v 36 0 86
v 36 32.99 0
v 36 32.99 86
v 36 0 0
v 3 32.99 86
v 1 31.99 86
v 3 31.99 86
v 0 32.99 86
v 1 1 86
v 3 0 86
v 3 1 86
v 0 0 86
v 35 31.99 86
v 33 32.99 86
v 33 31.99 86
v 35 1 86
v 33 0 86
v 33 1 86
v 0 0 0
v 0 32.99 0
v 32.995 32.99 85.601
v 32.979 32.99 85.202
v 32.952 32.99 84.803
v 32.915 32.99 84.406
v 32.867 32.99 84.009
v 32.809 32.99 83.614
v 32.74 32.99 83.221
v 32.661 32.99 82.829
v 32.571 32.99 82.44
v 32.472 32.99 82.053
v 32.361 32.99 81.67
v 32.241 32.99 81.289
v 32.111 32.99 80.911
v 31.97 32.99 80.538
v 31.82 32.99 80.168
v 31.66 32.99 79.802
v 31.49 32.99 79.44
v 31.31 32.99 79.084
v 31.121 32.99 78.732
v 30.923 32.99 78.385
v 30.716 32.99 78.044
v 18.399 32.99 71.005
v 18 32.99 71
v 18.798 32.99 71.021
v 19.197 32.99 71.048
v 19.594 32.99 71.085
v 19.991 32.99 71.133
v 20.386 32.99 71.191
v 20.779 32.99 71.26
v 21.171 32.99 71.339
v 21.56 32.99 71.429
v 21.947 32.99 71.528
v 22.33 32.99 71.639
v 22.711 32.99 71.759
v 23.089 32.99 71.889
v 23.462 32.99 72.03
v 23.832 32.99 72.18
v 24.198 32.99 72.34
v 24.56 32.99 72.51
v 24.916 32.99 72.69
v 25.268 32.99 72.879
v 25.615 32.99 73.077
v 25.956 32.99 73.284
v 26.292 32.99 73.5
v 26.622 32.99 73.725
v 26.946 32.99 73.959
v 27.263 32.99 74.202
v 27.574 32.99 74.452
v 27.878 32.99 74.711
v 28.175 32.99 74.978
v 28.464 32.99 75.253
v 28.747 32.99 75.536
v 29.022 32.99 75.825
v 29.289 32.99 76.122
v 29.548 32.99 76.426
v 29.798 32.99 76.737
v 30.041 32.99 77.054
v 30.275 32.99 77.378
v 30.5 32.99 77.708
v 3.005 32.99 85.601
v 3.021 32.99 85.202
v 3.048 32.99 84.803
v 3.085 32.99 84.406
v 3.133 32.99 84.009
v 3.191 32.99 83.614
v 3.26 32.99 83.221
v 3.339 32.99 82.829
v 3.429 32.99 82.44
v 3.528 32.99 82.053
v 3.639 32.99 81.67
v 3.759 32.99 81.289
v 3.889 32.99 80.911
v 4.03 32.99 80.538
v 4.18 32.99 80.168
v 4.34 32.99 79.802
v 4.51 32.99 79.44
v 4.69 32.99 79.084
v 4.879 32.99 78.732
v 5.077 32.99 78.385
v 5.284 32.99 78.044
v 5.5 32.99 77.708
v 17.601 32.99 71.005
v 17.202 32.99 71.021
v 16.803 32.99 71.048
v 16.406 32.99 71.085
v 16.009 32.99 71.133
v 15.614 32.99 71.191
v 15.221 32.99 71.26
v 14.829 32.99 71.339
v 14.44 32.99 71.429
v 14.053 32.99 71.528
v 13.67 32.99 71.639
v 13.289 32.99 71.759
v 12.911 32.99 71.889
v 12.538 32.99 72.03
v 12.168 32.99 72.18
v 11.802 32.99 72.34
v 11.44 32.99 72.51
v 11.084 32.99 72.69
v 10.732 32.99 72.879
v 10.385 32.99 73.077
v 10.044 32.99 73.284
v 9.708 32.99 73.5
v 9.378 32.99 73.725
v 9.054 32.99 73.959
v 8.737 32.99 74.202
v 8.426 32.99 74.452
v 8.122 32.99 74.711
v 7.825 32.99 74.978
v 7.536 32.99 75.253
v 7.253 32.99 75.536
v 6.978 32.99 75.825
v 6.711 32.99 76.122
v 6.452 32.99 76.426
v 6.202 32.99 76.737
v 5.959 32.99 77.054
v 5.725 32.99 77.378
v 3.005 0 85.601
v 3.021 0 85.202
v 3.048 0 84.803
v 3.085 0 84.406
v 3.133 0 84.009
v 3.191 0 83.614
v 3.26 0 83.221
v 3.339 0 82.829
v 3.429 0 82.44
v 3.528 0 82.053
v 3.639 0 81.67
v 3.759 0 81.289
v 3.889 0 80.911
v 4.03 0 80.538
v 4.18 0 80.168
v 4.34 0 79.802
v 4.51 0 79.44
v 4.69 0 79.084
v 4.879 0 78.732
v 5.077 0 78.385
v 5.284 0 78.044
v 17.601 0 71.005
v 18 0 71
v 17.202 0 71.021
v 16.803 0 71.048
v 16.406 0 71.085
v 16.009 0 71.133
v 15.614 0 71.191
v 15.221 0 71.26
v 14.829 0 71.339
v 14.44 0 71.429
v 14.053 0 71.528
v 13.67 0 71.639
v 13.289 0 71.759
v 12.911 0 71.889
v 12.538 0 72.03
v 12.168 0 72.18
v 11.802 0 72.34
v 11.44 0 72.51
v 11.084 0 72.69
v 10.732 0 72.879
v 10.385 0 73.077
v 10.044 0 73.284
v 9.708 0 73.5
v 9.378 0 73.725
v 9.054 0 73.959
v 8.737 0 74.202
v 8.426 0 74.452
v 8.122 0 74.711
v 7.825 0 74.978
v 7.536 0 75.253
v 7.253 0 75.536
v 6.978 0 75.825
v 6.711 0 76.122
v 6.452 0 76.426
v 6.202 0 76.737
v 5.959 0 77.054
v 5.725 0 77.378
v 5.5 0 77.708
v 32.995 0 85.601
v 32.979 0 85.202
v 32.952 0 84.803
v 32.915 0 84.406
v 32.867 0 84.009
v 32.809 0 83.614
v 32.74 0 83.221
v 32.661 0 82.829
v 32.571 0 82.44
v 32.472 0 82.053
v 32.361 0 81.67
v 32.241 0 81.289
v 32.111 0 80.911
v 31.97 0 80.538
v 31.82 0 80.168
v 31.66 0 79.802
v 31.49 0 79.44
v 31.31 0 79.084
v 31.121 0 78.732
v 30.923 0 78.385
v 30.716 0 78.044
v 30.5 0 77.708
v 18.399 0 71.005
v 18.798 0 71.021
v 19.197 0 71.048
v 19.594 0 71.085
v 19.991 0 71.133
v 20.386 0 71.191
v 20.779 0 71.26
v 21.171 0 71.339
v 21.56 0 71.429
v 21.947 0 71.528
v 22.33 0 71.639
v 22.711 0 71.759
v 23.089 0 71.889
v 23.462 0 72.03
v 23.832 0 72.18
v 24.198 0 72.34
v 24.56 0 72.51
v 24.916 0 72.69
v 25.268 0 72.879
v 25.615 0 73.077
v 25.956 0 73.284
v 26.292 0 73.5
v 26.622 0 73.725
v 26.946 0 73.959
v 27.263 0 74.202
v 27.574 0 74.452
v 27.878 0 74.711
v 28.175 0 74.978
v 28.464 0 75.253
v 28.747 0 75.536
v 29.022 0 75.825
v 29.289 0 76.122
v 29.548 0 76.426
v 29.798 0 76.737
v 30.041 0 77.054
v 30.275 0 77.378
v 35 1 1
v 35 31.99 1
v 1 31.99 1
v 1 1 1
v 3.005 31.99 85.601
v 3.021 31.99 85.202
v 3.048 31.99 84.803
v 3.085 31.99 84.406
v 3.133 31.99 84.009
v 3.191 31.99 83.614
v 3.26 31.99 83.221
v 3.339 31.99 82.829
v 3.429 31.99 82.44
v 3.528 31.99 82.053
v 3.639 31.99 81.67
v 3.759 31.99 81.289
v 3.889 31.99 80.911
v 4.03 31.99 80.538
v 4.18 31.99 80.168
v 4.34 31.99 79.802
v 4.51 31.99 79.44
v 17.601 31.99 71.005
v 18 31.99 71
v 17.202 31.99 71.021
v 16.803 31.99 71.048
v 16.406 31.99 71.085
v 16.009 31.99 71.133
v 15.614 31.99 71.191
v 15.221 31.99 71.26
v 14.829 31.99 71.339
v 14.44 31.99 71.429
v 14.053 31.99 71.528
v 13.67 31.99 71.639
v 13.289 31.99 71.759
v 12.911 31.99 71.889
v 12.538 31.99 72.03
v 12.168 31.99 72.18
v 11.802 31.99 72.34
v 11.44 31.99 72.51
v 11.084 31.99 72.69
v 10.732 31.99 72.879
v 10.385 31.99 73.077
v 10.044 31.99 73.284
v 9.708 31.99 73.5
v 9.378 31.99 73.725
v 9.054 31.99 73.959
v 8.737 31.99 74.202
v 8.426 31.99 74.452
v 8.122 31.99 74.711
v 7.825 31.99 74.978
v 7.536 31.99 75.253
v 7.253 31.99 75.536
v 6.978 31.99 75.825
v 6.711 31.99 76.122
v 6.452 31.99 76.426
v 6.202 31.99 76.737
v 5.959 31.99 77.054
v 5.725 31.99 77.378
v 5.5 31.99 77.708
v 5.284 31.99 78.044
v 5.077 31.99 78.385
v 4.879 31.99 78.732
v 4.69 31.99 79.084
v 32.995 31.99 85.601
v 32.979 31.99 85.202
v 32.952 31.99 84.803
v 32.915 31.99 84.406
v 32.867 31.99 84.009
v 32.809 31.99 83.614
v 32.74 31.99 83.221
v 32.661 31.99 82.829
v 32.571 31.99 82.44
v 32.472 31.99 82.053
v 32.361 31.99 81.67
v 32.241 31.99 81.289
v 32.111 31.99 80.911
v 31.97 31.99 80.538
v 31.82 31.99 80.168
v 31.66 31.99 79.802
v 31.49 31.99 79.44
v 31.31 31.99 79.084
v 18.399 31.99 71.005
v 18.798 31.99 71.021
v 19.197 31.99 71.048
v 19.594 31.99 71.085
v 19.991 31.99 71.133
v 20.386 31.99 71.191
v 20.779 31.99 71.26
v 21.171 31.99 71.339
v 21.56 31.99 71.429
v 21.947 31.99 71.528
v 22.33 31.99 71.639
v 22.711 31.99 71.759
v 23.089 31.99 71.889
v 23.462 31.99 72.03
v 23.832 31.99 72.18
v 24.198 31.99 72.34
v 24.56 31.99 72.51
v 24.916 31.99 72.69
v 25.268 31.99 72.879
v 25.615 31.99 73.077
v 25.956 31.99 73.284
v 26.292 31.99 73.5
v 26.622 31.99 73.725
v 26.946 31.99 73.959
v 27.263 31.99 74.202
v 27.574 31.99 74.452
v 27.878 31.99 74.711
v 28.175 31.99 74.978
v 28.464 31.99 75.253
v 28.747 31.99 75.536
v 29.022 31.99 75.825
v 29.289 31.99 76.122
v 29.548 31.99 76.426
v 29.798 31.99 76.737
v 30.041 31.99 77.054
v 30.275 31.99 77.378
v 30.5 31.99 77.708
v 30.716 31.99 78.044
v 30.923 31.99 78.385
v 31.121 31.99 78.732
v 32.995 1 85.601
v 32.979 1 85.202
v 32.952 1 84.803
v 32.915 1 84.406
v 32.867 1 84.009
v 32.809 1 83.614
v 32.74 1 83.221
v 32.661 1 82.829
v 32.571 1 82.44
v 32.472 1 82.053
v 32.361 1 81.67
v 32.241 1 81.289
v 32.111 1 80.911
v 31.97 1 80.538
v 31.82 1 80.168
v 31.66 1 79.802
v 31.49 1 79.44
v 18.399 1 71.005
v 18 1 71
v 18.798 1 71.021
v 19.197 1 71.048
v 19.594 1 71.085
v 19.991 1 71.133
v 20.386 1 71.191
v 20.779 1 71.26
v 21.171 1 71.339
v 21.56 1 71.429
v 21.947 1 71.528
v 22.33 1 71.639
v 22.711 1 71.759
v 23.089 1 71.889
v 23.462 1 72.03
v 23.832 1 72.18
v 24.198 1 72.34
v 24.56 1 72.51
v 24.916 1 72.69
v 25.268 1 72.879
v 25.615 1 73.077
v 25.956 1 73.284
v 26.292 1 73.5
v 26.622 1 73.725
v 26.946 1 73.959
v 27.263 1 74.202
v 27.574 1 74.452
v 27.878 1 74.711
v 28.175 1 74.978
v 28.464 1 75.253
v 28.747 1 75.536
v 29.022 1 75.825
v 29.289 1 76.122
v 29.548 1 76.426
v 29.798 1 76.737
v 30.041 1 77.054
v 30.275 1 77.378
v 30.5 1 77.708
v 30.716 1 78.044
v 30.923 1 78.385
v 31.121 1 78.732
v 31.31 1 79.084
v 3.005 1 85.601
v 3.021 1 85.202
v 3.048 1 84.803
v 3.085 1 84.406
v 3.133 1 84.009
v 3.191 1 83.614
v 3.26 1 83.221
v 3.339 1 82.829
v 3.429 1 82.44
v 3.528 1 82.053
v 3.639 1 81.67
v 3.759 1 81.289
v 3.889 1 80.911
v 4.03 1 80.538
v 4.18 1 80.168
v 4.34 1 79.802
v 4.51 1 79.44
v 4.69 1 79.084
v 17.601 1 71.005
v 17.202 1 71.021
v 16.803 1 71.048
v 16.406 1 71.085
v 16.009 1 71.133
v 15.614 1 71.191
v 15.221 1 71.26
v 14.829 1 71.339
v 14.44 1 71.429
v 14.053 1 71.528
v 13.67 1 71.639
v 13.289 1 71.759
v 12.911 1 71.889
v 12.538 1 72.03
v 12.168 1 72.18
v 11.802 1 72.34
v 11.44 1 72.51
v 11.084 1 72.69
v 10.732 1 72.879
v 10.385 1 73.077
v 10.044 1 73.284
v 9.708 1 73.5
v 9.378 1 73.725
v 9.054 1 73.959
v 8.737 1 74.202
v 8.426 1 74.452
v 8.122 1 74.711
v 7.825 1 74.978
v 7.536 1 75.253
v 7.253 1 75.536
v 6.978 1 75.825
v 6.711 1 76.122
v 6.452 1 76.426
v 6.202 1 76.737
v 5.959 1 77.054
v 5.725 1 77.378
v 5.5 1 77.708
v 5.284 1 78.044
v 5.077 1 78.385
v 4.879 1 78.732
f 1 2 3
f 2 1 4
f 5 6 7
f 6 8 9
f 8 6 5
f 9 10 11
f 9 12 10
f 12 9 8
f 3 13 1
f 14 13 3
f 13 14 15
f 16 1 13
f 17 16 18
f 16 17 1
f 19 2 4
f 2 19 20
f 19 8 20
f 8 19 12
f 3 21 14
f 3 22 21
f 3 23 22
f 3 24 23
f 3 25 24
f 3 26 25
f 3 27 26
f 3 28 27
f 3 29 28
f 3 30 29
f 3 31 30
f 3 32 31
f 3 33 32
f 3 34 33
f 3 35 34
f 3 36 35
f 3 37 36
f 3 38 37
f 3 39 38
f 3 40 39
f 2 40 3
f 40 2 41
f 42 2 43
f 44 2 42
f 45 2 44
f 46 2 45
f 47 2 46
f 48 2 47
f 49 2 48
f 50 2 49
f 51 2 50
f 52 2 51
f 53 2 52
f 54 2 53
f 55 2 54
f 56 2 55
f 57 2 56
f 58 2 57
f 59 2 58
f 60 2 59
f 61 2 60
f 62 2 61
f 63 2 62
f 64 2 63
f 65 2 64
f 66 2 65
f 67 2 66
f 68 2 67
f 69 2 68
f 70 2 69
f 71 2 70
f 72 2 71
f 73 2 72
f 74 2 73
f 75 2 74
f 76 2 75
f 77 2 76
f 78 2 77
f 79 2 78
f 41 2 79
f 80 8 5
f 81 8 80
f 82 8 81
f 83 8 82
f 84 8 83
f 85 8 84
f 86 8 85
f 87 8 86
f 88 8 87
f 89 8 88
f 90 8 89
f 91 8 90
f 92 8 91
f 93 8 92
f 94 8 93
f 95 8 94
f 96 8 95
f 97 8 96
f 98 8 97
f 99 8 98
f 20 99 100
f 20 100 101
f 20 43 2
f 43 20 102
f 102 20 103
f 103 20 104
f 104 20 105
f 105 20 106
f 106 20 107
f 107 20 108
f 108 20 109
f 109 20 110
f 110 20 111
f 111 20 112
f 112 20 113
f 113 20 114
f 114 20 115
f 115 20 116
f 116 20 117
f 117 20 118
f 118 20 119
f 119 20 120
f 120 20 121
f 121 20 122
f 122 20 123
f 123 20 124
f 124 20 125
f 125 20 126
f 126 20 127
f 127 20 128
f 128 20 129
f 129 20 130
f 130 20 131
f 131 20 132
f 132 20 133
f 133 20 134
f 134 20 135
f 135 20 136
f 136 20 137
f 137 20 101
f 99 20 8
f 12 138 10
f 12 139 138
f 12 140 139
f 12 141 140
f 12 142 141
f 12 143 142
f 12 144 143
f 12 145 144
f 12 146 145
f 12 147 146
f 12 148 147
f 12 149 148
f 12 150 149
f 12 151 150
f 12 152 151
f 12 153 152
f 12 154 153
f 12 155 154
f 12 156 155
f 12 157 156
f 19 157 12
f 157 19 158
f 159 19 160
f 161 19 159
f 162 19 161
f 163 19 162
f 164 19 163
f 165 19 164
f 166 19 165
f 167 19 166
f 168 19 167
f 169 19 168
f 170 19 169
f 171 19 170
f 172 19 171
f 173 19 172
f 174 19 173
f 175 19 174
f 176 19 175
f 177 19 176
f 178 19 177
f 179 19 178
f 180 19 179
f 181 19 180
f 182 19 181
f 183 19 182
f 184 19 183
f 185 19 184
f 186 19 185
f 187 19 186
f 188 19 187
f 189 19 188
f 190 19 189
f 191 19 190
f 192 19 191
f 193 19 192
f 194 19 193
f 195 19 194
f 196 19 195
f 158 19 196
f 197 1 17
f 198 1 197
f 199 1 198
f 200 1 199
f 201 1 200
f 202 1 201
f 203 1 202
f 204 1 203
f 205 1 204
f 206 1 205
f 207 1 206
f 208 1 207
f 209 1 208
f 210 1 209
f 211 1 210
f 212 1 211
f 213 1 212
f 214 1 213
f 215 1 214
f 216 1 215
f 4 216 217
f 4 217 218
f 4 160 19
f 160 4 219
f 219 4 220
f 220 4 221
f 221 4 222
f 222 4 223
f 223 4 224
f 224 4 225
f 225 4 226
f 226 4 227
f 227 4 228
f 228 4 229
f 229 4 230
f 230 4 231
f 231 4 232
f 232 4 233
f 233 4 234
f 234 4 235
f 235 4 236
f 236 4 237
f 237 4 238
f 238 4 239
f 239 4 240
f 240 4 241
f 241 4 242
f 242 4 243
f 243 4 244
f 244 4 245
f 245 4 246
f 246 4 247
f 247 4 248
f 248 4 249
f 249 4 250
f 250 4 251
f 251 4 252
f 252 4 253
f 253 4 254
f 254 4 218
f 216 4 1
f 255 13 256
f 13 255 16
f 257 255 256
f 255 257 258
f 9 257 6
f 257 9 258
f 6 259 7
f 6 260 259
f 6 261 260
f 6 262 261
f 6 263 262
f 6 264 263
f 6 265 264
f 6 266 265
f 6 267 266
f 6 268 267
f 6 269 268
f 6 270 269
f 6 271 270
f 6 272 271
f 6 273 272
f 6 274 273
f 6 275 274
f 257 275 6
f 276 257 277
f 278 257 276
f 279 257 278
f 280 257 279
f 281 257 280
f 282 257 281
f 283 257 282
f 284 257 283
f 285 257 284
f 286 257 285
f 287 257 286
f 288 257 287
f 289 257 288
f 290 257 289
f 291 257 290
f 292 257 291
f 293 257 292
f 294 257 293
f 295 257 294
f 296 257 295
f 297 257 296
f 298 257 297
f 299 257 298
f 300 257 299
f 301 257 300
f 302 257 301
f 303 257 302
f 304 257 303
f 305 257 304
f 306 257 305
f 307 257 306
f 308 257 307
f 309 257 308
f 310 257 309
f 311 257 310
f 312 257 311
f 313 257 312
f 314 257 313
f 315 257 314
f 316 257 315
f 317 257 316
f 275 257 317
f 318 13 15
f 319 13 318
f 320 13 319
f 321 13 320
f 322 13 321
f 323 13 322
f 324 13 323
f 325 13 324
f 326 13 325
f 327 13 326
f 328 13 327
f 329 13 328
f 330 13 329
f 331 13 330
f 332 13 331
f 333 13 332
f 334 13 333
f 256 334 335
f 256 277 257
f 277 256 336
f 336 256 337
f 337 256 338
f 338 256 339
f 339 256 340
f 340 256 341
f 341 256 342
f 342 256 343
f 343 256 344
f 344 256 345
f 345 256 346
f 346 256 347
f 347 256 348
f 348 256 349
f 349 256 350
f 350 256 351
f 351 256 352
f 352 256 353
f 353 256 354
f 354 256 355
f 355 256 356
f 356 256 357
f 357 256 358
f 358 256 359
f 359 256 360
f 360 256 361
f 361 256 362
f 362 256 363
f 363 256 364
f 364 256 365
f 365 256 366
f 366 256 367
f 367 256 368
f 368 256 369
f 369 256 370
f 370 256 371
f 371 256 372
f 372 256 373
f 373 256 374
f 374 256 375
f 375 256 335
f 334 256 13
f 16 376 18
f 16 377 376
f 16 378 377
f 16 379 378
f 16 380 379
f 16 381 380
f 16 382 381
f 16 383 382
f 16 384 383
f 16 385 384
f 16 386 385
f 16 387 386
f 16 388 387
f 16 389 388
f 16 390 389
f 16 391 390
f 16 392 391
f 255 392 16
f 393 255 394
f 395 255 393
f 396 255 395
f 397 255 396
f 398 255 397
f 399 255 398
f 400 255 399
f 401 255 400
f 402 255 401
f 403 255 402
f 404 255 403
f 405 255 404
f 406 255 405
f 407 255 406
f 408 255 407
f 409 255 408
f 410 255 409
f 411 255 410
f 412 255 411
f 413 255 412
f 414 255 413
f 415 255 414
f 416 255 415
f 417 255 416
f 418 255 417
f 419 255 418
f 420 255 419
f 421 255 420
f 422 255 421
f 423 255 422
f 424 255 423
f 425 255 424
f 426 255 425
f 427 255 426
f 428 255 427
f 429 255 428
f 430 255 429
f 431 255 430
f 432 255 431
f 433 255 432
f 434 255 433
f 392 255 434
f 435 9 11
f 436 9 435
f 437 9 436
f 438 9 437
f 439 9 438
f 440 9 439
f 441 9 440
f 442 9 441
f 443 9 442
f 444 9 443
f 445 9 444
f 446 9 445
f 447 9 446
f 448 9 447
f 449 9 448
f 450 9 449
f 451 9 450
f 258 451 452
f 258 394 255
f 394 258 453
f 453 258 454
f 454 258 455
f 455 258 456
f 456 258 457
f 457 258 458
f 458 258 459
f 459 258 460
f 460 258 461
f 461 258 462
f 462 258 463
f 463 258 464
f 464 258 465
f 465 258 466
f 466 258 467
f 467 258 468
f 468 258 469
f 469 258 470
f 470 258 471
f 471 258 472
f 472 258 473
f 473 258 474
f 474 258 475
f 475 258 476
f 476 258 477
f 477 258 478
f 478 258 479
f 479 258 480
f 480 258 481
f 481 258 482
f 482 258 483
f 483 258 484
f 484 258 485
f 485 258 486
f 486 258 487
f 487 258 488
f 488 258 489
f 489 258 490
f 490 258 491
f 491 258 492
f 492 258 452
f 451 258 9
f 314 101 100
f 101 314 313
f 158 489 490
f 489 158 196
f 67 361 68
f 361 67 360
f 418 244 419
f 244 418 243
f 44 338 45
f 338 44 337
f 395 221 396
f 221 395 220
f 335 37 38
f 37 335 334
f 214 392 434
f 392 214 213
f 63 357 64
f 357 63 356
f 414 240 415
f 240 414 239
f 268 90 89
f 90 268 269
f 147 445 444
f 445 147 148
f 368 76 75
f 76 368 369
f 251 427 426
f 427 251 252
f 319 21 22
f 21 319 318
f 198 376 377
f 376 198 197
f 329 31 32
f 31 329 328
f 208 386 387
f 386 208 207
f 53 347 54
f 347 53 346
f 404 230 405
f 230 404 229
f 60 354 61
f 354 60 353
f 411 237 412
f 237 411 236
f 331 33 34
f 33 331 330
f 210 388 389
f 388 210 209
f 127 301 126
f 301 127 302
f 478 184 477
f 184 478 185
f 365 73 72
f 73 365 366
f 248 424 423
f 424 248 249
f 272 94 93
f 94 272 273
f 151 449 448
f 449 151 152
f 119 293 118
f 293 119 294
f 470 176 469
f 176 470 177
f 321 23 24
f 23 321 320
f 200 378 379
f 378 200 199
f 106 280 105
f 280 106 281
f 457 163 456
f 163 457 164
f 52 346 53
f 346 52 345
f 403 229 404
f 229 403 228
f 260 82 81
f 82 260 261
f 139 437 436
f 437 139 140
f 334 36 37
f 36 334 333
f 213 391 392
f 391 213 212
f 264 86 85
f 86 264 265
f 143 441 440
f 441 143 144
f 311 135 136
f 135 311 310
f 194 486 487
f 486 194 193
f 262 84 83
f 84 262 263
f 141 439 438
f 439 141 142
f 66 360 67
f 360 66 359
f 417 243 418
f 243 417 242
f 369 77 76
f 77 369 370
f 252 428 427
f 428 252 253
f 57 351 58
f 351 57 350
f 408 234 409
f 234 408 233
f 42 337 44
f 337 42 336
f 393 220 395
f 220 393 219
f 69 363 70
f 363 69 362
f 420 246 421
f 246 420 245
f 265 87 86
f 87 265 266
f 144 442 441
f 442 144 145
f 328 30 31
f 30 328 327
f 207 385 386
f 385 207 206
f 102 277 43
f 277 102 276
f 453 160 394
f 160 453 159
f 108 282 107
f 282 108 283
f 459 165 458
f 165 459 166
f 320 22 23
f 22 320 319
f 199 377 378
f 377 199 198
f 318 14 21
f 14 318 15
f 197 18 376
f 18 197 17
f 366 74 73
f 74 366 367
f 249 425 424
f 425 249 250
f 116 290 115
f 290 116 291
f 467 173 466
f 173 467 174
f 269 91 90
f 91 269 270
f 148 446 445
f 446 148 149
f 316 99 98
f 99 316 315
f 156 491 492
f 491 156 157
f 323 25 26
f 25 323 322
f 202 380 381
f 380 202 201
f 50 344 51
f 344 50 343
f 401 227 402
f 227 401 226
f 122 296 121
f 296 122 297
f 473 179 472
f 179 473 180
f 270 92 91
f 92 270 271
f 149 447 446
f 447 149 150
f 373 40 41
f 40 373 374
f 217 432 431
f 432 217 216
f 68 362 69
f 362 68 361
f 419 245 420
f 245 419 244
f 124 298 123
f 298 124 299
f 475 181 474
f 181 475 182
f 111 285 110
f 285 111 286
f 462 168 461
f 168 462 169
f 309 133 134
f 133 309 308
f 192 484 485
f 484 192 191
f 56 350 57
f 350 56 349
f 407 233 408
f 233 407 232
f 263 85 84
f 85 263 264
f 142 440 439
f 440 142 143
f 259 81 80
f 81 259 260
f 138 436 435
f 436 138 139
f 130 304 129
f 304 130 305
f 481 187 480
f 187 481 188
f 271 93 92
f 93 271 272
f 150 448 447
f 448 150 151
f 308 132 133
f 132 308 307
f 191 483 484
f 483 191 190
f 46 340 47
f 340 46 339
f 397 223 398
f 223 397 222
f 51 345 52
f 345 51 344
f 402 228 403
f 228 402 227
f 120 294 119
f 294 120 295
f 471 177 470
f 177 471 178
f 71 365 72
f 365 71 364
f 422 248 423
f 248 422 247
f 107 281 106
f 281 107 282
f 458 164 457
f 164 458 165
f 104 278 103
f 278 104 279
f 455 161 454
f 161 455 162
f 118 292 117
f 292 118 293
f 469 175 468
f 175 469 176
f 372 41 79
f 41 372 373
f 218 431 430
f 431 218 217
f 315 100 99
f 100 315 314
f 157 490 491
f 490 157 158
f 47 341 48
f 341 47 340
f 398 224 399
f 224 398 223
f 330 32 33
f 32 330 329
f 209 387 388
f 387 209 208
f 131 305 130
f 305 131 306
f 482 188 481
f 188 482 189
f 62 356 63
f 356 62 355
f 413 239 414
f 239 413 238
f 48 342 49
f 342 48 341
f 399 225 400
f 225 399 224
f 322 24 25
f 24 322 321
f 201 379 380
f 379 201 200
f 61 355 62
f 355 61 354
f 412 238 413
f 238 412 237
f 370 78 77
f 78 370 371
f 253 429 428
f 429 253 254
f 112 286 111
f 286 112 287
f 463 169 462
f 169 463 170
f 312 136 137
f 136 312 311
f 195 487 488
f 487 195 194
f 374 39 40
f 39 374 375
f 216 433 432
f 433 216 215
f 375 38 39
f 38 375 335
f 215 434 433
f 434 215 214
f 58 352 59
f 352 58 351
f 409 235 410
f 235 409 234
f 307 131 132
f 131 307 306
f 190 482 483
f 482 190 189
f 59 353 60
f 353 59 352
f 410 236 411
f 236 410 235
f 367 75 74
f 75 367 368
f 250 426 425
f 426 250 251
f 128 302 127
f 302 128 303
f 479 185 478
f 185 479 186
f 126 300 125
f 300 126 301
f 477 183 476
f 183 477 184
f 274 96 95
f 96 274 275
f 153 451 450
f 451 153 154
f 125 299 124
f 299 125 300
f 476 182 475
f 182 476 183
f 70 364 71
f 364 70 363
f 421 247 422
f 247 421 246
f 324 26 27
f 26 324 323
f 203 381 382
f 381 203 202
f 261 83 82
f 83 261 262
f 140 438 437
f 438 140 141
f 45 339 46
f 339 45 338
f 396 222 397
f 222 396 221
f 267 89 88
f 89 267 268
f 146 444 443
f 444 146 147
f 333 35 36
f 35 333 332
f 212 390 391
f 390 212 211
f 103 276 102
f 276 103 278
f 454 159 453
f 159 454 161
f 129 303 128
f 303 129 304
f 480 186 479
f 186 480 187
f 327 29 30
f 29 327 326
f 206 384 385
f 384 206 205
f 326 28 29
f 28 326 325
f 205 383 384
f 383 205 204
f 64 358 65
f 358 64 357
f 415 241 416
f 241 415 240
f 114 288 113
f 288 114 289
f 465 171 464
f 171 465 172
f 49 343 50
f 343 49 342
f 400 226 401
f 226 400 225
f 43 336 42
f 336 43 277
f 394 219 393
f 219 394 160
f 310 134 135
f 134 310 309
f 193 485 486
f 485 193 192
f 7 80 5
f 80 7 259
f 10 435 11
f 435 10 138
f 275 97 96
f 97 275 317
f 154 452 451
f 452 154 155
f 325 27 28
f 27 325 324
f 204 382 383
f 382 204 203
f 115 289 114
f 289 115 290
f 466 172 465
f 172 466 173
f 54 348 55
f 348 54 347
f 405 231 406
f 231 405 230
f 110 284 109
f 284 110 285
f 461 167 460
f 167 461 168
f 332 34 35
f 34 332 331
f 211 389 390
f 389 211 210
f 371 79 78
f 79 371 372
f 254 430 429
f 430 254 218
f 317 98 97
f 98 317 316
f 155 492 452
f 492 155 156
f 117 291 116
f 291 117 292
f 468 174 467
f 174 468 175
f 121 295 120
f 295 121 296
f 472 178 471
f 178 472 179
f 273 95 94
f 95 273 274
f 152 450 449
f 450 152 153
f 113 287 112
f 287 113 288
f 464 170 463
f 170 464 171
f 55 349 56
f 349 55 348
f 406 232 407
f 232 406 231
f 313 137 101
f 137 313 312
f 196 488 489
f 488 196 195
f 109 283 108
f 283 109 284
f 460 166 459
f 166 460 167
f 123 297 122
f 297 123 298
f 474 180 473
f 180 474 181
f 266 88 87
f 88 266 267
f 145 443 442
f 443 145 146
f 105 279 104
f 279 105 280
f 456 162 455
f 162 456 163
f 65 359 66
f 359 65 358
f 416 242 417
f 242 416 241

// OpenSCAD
/**
 * ----------------------------------------------------------------------------
 *
 * Name:        Vertical Breathe Right® strip container
 * Version:     v1
 * Description: A simple container, open at the top, which holds approximately
 *              one box (26 count) of Breathe Right® Extra Strength nasal
 *              strips vertically.
 *
 * ----------------------------------------------------------------------------
 *
 * Copyright © 2024 JimmyMadeThat
 *
 * This work is licensed under the `CC BY-NC-SA 4.0`
 * (Attribution-NonCommercial-ShareAlike 4.0 International) license. To view a
 * copy of this license, visit:
 *
 *   <http://creativecommons.org/licenses/by-nc-sa/4.0/>
 *
 * ----------------------------------------------------------------------------
 */

/**
 * ================
 *    Parameters
 * ================
 */

/* [Strip Size and Count] */

// actual width in mm of the nasal strips
strip_width                 = 33;     // [1:100]
// actual length in mm of the nasal strips
strip_length                = 84;     // [50:500]
// actual strip thickness when loosely stacked
strip_thickness             = 1.115;  // [0.5:0.0001:2.0]
// number of strips container will hold
strip_count                 = 26;     // [0:300]

/* [Extra Space in Container] */

// total mm of additional horizontal/width space to be added inside
horizontal_space_added      = 1;      // [0:10]
// total mm of additional vertical/length space to be added inside
vertical_space_added        = 1;      // [0:10]
// total mm of additional depth/thickness space to be added inside
depth_added                 = 2;      // [1:10]

/* [Wall Configuration] */

// thickness in mm of the walls
wall_thickness              = 1;      // [0.5:0.1:5]
// mm of straight wall on each side before curved cutout begins
wall_padding_before_cutout  = 2;      // [0:0.5:50]

/**
 * ====================
 *    End Parameters
 * ====================
 */

/* [Hidden] */

// Resolution settings
$fa = 1;
$fs = 0.4;

fudge = 0.001;

total_strip_depth = strip_count * strip_thickness;

inner_box_width = strip_width + horizontal_space_added;
outer_box_width = inner_box_width + (wall_thickness * 2);

inner_box_height = strip_length + vertical_space_added + fudge;
outer_box_height = inner_box_height + wall_thickness - fudge; // no lid

inner_box_depth = total_strip_depth + depth_added;
outer_box_depth = inner_box_depth + (wall_thickness * 2);

cutout_width = inner_box_width - (2 * wall_padding_before_cutout);
cutout_radius = cutout_width / 2;
cutout_height = outer_box_depth + (2 * fudge);

cutout_center_x = outer_box_width / 2;
cutout_center_y = outer_box_height;
cutout_center_z = -outer_box_depth - fudge;

difference() {
  // Outer box
  cube([outer_box_width, outer_box_depth, outer_box_height]);
  // Inner box cutout
  translate([wall_thickness, wall_thickness, wall_thickness])
    cube([inner_box_width, inner_box_depth, inner_box_height]);
  rotate([90,0,0])
  // Rounded cutout
  translate([cutout_center_x, cutout_center_y, cutout_center_z])
    cylinder(h = cutout_height, r1 = cutout_radius, r2 = cutout_radius);
}
